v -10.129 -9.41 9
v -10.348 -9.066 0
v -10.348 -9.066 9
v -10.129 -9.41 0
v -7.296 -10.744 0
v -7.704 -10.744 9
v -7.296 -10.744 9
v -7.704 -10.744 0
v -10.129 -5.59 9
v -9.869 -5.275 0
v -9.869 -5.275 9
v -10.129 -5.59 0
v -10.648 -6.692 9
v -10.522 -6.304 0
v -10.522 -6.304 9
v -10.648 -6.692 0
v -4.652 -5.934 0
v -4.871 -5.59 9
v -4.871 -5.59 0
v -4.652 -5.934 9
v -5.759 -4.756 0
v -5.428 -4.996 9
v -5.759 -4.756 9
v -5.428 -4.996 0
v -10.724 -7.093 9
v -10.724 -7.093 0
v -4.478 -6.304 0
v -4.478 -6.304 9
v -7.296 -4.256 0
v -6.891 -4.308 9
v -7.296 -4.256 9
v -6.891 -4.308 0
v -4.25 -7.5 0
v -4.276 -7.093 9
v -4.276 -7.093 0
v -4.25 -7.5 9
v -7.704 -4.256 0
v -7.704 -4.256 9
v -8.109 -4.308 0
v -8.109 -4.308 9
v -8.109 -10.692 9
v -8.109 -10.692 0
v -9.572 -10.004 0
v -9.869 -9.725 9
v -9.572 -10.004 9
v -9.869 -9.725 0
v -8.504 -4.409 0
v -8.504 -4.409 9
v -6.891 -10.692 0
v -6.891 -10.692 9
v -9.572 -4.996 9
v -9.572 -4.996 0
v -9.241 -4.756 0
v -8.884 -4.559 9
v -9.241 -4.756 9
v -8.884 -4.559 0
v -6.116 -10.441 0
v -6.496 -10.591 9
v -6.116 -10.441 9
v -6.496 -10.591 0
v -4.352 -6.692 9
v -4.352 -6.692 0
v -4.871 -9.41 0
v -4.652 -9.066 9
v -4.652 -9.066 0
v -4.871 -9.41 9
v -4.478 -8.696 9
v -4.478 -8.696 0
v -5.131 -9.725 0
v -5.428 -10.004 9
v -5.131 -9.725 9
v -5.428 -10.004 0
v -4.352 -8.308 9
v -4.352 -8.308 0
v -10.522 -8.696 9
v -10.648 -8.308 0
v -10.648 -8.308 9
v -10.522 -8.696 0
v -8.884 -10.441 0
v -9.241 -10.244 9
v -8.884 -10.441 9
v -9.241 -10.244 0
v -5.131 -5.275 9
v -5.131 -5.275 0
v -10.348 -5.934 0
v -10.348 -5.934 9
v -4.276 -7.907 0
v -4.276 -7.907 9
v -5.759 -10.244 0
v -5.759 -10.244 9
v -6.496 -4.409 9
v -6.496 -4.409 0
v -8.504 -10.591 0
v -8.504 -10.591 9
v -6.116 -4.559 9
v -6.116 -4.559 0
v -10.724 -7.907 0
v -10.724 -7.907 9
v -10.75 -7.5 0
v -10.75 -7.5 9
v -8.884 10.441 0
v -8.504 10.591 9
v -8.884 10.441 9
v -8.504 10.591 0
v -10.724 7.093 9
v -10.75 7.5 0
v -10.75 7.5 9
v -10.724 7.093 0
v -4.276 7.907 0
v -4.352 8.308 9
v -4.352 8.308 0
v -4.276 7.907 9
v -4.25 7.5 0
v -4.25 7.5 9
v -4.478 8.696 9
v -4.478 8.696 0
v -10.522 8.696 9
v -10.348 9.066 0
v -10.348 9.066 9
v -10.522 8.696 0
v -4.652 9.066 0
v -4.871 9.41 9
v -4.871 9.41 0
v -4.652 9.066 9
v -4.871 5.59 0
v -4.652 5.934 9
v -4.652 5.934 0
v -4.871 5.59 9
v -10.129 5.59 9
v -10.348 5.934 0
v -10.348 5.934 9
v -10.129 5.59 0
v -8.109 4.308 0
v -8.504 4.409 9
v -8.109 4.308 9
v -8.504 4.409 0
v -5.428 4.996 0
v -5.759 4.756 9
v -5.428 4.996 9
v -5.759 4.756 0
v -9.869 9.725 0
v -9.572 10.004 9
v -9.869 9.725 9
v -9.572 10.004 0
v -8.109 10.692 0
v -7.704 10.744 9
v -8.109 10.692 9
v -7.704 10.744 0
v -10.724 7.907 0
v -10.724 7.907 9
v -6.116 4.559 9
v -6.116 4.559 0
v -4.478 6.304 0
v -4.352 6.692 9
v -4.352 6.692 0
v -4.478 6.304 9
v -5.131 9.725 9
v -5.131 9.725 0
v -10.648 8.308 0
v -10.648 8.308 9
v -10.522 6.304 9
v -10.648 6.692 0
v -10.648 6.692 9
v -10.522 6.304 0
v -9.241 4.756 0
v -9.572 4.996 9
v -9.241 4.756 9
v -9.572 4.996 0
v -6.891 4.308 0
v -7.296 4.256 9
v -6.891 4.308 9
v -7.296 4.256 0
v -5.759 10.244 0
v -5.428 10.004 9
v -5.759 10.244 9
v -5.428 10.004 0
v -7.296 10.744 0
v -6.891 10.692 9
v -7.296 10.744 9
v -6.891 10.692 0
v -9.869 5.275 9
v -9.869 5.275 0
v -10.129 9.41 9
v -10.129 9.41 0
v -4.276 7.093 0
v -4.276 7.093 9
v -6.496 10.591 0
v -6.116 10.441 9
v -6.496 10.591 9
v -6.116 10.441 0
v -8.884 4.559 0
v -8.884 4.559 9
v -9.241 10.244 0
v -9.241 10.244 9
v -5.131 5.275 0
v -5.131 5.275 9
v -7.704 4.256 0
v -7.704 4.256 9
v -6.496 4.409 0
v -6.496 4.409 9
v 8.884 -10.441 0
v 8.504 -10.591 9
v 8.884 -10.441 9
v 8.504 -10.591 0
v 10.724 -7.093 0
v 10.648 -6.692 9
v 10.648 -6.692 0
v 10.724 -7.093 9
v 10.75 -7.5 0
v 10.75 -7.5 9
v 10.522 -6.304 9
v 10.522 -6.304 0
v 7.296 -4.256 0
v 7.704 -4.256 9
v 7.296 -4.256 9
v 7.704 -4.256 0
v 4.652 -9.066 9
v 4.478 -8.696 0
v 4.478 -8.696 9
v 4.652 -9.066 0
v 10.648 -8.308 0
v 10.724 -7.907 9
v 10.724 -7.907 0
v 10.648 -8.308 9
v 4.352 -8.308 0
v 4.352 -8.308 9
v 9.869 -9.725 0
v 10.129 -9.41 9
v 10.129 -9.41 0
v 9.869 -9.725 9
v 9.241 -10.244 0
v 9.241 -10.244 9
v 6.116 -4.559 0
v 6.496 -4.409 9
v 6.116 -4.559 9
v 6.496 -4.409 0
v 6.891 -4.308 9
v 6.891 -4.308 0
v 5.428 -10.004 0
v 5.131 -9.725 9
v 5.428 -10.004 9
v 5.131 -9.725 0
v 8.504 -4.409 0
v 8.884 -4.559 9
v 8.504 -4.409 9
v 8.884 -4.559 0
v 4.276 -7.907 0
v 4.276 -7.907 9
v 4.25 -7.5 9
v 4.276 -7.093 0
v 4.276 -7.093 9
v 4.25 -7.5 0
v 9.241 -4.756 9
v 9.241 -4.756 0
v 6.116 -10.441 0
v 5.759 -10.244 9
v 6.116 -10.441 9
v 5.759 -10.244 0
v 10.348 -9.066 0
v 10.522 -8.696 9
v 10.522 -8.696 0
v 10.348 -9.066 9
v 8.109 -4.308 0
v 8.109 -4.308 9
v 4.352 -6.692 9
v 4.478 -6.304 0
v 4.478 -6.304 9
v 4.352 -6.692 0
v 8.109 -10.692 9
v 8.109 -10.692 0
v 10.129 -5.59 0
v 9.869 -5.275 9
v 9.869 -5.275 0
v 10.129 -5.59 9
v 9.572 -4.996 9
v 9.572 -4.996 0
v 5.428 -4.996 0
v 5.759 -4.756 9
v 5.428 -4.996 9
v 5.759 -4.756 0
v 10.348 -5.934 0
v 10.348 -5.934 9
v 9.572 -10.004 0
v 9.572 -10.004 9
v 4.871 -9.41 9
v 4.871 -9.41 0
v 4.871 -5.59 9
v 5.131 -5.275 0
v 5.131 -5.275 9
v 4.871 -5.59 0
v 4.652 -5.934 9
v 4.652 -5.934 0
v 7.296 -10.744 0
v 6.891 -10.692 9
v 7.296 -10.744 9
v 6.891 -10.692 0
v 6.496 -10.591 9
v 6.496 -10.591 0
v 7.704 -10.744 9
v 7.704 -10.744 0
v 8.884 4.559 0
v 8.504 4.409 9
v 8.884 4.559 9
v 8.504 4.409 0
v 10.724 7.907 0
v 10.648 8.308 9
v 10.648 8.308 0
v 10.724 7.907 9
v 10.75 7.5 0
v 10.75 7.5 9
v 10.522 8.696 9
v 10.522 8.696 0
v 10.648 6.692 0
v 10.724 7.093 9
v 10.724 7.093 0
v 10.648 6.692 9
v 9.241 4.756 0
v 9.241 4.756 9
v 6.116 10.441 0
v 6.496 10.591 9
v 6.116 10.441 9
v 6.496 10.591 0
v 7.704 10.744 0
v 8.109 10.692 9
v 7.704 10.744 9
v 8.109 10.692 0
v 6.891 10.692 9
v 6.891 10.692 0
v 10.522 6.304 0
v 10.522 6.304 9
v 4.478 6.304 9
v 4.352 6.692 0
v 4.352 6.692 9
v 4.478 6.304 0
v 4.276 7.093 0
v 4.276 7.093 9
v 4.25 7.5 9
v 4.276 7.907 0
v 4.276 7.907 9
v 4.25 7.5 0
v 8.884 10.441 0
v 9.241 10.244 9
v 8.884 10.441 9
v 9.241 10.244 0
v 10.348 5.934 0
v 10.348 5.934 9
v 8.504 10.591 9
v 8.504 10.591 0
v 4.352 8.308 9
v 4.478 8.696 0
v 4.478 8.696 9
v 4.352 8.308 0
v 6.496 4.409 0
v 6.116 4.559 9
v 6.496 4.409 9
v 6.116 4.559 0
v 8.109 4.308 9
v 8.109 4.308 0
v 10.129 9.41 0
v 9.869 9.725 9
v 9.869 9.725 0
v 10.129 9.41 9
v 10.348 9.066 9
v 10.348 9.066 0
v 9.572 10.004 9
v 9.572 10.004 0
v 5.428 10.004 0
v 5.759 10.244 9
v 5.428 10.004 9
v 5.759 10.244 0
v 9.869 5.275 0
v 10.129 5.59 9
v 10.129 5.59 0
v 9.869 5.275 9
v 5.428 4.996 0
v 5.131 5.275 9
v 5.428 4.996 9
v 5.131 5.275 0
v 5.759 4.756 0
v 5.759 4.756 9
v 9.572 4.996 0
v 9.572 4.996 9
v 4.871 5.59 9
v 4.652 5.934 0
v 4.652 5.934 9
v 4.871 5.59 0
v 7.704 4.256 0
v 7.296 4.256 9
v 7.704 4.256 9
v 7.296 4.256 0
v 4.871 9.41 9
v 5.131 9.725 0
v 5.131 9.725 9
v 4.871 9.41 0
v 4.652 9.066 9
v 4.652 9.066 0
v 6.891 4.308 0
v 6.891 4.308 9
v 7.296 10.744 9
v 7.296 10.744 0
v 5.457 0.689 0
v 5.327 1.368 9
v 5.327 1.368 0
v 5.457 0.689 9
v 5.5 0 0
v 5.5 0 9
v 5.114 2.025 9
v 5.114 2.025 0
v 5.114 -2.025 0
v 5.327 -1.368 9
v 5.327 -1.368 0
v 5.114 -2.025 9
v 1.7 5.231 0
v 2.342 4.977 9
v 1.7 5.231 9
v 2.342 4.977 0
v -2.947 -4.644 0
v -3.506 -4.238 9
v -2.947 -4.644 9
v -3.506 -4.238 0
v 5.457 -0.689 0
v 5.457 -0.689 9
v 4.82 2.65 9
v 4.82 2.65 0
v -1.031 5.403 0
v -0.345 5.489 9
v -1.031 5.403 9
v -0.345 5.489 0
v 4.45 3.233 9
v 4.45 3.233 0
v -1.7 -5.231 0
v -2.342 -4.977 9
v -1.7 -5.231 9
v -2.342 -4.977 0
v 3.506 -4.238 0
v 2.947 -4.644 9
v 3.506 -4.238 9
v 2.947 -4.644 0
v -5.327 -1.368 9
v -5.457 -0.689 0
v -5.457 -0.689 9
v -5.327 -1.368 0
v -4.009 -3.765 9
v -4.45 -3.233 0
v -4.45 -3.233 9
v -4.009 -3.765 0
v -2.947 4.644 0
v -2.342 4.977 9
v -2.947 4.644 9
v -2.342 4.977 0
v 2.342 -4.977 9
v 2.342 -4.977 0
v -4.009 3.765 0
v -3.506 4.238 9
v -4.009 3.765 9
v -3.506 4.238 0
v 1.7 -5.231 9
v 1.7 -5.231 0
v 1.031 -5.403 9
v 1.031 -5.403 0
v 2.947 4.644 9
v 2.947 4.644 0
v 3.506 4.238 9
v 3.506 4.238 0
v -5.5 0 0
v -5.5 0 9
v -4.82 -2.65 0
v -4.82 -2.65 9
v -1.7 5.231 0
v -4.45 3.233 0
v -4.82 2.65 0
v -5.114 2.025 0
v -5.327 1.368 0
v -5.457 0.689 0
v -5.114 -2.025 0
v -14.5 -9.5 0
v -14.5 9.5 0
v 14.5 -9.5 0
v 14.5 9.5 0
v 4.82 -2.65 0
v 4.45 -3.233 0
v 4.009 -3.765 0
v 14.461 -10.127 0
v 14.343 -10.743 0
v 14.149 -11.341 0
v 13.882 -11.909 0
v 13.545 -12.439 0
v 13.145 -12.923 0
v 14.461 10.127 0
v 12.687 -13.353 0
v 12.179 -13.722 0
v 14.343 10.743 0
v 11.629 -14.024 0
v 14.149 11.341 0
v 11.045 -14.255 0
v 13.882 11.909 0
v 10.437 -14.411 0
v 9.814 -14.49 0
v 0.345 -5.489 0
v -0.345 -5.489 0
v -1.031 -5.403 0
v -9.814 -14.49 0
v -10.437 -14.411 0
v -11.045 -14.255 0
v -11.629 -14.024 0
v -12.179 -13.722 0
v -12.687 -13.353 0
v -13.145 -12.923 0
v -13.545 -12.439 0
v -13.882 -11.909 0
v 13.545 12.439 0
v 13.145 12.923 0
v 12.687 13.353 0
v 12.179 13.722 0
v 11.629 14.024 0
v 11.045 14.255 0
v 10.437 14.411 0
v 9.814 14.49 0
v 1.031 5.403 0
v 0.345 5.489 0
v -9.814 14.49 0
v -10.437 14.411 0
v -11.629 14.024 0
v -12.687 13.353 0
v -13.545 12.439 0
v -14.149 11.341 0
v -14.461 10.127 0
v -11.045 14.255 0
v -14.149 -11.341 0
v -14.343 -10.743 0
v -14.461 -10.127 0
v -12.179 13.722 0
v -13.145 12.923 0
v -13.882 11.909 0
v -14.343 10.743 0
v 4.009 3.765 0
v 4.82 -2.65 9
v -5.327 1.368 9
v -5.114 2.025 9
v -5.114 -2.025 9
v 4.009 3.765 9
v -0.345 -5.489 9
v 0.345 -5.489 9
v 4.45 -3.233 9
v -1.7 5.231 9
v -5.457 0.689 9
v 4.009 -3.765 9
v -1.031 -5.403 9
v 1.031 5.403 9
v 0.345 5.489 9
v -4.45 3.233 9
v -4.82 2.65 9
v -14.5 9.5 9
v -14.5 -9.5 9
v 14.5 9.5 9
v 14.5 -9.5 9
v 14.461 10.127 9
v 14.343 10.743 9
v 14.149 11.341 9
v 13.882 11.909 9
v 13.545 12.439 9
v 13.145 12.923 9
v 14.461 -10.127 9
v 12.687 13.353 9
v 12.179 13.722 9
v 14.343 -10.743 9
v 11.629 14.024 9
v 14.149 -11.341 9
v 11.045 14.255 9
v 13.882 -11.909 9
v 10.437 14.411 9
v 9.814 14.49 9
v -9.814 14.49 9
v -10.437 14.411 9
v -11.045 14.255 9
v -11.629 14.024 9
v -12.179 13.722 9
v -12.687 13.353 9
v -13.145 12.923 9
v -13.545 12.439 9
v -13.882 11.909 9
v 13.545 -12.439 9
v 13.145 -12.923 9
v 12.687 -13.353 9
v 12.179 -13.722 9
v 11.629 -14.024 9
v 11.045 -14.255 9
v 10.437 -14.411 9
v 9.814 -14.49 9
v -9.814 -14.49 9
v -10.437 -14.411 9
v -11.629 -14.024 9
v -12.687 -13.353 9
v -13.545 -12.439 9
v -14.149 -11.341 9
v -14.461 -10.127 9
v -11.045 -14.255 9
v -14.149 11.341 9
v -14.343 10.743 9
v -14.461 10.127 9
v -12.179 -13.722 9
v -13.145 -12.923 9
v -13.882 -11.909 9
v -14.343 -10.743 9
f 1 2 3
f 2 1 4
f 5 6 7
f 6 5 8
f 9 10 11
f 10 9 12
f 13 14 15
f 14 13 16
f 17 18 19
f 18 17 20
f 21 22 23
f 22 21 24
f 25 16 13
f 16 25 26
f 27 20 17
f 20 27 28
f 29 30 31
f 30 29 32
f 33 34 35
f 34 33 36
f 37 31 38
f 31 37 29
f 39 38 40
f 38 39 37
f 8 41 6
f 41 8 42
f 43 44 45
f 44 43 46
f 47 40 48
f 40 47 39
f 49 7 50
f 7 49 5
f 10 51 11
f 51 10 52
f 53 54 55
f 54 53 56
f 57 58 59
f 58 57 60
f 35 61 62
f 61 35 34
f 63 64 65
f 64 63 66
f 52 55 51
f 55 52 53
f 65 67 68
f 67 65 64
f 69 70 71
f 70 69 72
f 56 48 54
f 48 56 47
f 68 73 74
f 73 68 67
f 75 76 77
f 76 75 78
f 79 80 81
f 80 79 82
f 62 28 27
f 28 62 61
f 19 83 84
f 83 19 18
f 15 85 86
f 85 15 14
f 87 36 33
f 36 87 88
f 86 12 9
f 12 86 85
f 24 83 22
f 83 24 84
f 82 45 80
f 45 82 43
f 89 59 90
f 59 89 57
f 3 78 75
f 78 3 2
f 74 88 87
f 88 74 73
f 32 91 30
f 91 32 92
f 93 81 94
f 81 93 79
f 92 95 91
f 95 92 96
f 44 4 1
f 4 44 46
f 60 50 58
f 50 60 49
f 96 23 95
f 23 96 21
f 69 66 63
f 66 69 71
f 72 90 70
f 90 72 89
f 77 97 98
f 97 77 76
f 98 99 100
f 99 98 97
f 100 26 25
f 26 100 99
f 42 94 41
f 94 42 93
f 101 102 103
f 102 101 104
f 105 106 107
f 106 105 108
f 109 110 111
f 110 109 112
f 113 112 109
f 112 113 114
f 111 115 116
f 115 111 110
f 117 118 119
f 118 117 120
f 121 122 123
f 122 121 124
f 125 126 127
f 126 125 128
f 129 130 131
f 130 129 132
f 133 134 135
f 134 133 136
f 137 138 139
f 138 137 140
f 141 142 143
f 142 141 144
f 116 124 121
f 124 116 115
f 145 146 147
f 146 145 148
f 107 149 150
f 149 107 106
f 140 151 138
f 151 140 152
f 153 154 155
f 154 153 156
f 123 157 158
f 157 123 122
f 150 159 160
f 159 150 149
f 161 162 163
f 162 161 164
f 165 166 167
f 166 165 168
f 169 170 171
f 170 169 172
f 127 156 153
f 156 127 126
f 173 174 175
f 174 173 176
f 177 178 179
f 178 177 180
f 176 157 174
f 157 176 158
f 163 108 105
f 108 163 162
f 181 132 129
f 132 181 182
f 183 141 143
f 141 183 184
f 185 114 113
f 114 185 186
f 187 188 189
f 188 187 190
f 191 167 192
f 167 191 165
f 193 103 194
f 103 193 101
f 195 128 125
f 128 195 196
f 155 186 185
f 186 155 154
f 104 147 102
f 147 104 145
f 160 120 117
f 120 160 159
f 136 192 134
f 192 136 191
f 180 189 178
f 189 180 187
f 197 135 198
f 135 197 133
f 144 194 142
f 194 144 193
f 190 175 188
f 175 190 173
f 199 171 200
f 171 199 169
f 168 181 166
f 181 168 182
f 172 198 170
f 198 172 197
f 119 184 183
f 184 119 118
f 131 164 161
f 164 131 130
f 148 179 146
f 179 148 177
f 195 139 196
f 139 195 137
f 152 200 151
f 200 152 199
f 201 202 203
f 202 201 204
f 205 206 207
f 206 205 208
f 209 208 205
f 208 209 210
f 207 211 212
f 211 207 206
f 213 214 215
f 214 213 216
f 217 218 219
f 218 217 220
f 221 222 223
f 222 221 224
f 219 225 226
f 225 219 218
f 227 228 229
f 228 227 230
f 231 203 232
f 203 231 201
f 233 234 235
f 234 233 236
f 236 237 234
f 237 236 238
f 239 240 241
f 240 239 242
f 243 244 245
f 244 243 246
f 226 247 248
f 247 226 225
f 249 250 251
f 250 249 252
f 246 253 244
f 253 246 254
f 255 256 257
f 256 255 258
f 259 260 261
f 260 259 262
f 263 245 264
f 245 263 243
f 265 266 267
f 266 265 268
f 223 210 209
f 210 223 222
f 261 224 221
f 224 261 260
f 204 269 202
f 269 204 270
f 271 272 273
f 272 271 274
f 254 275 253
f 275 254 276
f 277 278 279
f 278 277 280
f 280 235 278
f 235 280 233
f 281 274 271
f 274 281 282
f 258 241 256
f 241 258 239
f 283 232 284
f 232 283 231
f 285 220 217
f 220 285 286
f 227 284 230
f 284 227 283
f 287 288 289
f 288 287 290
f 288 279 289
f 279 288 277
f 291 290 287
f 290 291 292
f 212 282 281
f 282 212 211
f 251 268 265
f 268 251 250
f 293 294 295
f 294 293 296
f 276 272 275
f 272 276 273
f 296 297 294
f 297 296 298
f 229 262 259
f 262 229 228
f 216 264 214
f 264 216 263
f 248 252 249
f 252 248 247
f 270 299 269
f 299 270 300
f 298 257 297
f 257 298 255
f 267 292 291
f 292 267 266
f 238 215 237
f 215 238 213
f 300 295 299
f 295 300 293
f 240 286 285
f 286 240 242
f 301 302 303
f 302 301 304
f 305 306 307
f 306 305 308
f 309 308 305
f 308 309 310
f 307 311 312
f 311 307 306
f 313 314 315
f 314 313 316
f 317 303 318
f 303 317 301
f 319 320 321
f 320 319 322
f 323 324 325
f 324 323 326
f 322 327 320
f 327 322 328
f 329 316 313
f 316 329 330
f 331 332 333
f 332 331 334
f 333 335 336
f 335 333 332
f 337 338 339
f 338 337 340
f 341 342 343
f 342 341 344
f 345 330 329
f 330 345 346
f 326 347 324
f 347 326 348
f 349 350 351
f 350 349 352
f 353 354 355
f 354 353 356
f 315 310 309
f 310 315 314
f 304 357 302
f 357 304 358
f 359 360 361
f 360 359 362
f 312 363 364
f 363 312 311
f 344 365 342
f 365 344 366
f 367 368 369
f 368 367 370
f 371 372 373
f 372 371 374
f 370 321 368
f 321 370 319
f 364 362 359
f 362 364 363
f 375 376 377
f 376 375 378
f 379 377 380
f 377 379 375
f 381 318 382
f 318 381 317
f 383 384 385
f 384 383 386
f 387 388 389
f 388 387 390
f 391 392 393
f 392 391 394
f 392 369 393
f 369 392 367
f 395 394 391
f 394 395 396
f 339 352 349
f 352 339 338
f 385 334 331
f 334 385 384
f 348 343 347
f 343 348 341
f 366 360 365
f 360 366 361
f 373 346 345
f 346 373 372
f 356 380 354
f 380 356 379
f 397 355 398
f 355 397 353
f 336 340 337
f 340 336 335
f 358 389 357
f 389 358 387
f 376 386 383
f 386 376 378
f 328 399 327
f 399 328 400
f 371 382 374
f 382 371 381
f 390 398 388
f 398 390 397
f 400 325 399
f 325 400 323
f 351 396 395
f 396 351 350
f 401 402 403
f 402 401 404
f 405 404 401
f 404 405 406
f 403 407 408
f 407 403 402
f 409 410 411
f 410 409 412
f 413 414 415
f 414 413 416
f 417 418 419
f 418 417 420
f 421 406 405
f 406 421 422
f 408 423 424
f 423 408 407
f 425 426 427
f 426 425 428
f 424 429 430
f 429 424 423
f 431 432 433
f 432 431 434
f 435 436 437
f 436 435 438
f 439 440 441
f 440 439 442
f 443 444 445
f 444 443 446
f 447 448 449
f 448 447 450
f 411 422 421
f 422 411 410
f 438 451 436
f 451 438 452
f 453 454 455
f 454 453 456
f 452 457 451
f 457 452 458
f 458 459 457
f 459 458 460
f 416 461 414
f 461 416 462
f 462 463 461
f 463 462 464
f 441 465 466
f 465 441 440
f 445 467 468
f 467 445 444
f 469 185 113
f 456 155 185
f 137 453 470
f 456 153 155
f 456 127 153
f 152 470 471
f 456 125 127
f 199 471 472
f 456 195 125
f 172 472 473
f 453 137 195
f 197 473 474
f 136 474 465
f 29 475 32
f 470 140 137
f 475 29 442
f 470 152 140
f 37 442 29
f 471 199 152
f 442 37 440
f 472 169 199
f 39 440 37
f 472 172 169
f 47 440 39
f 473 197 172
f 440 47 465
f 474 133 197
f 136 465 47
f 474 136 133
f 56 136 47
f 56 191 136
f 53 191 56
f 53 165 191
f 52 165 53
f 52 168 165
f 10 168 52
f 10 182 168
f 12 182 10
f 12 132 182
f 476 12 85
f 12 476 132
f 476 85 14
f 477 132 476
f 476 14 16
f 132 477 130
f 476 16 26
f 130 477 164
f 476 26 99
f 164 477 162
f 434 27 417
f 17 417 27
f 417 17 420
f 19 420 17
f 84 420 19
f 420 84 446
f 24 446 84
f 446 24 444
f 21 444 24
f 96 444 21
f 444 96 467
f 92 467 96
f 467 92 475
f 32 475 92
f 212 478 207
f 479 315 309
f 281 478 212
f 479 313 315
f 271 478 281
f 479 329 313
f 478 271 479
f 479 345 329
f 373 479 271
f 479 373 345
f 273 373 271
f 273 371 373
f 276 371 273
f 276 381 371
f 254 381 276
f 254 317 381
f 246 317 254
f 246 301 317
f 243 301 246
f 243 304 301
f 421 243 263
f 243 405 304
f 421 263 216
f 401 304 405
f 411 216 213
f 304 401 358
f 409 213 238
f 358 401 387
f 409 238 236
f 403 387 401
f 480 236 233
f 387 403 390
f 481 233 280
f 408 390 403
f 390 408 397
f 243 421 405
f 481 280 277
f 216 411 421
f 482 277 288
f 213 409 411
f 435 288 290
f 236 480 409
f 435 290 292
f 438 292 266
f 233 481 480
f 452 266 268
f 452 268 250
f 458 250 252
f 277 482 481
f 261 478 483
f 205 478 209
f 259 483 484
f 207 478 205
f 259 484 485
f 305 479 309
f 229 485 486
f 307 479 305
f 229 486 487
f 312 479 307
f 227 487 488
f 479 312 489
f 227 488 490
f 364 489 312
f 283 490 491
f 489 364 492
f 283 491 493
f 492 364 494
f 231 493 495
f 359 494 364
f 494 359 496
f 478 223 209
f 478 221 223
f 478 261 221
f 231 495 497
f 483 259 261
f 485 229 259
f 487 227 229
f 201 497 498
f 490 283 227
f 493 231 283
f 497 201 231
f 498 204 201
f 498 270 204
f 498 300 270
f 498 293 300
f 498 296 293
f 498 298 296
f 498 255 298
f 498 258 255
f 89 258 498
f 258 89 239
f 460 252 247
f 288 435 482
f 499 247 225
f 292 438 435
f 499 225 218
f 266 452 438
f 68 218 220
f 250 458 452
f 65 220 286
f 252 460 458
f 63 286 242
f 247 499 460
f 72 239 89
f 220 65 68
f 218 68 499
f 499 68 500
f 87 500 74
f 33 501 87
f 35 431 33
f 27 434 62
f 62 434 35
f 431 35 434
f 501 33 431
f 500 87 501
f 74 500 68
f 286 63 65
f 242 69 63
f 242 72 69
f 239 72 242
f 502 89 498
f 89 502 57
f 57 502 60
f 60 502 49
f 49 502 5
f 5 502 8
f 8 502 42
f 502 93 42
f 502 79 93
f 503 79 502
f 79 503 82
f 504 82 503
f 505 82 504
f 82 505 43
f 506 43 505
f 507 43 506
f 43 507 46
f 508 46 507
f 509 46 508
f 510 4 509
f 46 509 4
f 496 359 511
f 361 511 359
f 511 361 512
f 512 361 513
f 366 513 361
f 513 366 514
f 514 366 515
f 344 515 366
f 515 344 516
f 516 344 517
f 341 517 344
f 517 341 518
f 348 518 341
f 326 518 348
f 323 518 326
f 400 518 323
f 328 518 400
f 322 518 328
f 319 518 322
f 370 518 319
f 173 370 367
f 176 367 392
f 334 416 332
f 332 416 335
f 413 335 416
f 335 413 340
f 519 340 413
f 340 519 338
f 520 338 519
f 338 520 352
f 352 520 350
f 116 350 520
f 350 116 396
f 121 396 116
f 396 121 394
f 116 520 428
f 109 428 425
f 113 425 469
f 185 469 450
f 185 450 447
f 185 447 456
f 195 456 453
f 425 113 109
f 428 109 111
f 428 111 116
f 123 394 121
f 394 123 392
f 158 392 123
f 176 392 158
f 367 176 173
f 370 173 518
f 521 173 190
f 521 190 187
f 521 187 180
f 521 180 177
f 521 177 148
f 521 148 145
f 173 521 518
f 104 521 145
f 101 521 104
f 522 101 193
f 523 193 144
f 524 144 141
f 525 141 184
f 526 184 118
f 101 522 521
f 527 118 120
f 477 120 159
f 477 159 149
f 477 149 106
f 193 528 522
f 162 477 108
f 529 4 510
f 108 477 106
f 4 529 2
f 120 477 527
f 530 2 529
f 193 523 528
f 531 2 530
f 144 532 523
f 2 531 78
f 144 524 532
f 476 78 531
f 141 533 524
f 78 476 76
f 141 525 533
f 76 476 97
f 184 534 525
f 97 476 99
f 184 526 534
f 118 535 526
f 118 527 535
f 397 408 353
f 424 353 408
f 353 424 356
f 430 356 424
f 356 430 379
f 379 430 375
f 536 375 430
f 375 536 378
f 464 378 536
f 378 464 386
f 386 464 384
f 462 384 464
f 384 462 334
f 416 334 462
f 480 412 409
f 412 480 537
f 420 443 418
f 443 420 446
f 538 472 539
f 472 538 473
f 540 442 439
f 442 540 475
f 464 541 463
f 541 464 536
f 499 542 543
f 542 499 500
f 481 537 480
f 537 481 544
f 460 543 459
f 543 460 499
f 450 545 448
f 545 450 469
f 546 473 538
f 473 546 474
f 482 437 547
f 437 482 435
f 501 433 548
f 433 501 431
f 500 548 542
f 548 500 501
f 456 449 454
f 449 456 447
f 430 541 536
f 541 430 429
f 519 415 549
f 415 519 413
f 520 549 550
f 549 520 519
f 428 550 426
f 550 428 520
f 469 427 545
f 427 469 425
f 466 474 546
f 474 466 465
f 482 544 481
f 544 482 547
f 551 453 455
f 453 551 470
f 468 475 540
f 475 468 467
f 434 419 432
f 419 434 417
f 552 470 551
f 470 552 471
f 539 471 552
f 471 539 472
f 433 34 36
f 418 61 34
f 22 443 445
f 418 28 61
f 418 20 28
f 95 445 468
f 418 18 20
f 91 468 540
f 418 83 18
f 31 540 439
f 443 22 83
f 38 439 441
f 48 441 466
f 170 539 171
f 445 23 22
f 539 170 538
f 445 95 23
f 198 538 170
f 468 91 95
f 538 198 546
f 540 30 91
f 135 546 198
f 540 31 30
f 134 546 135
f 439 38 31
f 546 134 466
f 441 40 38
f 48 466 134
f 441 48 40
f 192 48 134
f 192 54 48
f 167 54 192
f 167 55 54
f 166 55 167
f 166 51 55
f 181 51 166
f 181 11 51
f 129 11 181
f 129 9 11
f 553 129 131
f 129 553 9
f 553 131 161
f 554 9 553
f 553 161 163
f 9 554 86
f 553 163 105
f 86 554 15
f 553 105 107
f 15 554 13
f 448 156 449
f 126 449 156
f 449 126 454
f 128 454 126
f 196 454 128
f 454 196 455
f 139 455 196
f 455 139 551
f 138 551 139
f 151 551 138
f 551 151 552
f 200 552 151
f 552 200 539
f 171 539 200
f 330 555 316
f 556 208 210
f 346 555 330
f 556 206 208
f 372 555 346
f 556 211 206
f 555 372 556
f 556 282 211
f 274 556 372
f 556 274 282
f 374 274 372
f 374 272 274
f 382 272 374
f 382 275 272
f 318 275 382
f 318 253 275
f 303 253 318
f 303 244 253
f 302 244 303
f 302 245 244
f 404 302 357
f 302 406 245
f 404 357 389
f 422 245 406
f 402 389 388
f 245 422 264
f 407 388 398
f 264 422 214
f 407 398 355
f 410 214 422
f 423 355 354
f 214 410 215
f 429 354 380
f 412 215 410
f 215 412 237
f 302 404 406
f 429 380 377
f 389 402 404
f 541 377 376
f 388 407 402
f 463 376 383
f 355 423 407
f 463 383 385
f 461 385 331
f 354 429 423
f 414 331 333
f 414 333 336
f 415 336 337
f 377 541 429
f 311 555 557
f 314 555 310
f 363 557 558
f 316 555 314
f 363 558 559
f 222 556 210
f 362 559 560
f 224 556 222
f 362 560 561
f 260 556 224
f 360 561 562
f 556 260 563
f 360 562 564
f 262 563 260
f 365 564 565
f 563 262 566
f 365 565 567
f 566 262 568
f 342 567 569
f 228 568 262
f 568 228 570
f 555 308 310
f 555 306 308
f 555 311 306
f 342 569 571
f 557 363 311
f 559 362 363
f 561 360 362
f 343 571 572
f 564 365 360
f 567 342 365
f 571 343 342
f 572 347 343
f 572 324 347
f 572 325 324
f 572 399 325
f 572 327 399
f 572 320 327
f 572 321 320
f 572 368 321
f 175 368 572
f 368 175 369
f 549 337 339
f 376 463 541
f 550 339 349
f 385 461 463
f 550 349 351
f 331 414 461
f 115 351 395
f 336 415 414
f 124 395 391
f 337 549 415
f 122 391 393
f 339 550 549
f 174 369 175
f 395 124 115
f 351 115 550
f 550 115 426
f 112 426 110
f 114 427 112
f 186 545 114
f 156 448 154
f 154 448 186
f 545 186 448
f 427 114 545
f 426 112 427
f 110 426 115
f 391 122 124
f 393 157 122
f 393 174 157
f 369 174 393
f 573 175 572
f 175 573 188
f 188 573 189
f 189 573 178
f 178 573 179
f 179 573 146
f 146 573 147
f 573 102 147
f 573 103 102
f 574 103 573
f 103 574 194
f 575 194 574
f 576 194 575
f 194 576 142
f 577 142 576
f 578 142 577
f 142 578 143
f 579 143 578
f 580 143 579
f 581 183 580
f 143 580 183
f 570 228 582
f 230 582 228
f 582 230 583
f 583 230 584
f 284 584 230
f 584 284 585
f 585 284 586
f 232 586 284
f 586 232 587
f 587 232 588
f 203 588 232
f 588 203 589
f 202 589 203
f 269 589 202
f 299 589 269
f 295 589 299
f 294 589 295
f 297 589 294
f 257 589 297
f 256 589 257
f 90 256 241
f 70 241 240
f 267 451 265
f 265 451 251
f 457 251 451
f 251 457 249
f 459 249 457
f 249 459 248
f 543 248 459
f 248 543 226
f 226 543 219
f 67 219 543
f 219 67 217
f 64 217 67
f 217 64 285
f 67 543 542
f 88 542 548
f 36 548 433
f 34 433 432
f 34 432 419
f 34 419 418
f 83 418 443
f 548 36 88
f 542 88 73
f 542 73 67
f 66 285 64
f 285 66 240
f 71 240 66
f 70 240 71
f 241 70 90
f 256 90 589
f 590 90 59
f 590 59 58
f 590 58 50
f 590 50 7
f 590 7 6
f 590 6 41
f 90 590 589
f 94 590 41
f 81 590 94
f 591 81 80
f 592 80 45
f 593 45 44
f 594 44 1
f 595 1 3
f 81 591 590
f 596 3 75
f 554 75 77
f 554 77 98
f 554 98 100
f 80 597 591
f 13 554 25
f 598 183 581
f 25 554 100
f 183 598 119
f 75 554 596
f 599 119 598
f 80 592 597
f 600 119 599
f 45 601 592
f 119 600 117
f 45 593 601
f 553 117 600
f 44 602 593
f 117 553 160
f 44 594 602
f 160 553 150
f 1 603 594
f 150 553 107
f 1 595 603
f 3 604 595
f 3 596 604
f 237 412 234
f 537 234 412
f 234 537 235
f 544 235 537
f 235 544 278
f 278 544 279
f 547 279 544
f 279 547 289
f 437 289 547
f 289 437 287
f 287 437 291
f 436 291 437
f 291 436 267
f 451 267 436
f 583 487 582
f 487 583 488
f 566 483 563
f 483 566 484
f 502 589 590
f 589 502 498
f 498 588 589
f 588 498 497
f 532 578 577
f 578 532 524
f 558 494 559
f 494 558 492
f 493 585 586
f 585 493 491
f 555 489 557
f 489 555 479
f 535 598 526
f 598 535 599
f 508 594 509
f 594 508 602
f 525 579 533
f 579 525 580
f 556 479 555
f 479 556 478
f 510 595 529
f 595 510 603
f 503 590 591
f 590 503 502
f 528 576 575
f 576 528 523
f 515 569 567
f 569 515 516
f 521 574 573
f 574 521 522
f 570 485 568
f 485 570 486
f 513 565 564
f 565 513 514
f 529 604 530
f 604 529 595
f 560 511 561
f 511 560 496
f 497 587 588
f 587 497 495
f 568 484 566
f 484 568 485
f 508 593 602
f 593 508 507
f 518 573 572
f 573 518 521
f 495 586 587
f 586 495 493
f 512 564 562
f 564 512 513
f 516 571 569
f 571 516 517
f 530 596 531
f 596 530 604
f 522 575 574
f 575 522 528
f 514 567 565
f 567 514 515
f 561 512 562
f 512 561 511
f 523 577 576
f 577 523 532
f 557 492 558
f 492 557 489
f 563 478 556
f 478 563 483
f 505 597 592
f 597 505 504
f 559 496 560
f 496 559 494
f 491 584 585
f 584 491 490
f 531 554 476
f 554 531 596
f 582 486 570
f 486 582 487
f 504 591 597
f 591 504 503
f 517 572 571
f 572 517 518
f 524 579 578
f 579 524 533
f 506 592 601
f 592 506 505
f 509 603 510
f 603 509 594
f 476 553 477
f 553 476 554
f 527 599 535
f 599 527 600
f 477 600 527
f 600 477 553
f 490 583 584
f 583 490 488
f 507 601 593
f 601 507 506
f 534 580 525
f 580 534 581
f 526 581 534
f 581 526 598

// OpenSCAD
$fn = 50;


difference() {
	union() {
		hull() {
			translate(v = [-9.5000000000, 9.5000000000, 0]) {
				cylinder(h = 9, r = 5);
			}
			translate(v = [9.5000000000, 9.5000000000, 0]) {
				cylinder(h = 9, r = 5);
			}
			translate(v = [-9.5000000000, -9.5000000000, 0]) {
				cylinder(h = 9, r = 5);
			}
			translate(v = [9.5000000000, -9.5000000000, 0]) {
				cylinder(h = 9, r = 5);
			}
		}
	}
	union() {
		#translate(v = [-7.5000000000, -7.5000000000, -100.0000000000]) {
			cylinder(h = 200, r = 3.2500000000);
		}
		#translate(v = [-7.5000000000, 7.5000000000, -100.0000000000]) {
			cylinder(h = 200, r = 3.2500000000);
		}
		#translate(v = [7.5000000000, -7.5000000000, -100.0000000000]) {
			cylinder(h = 200, r = 3.2500000000);
		}
		#translate(v = [7.5000000000, 7.5000000000, -100.0000000000]) {
			cylinder(h = 200, r = 3.2500000000);
		}
		#cylinder(h = 9, r = 5.5000000000);
	}
}
